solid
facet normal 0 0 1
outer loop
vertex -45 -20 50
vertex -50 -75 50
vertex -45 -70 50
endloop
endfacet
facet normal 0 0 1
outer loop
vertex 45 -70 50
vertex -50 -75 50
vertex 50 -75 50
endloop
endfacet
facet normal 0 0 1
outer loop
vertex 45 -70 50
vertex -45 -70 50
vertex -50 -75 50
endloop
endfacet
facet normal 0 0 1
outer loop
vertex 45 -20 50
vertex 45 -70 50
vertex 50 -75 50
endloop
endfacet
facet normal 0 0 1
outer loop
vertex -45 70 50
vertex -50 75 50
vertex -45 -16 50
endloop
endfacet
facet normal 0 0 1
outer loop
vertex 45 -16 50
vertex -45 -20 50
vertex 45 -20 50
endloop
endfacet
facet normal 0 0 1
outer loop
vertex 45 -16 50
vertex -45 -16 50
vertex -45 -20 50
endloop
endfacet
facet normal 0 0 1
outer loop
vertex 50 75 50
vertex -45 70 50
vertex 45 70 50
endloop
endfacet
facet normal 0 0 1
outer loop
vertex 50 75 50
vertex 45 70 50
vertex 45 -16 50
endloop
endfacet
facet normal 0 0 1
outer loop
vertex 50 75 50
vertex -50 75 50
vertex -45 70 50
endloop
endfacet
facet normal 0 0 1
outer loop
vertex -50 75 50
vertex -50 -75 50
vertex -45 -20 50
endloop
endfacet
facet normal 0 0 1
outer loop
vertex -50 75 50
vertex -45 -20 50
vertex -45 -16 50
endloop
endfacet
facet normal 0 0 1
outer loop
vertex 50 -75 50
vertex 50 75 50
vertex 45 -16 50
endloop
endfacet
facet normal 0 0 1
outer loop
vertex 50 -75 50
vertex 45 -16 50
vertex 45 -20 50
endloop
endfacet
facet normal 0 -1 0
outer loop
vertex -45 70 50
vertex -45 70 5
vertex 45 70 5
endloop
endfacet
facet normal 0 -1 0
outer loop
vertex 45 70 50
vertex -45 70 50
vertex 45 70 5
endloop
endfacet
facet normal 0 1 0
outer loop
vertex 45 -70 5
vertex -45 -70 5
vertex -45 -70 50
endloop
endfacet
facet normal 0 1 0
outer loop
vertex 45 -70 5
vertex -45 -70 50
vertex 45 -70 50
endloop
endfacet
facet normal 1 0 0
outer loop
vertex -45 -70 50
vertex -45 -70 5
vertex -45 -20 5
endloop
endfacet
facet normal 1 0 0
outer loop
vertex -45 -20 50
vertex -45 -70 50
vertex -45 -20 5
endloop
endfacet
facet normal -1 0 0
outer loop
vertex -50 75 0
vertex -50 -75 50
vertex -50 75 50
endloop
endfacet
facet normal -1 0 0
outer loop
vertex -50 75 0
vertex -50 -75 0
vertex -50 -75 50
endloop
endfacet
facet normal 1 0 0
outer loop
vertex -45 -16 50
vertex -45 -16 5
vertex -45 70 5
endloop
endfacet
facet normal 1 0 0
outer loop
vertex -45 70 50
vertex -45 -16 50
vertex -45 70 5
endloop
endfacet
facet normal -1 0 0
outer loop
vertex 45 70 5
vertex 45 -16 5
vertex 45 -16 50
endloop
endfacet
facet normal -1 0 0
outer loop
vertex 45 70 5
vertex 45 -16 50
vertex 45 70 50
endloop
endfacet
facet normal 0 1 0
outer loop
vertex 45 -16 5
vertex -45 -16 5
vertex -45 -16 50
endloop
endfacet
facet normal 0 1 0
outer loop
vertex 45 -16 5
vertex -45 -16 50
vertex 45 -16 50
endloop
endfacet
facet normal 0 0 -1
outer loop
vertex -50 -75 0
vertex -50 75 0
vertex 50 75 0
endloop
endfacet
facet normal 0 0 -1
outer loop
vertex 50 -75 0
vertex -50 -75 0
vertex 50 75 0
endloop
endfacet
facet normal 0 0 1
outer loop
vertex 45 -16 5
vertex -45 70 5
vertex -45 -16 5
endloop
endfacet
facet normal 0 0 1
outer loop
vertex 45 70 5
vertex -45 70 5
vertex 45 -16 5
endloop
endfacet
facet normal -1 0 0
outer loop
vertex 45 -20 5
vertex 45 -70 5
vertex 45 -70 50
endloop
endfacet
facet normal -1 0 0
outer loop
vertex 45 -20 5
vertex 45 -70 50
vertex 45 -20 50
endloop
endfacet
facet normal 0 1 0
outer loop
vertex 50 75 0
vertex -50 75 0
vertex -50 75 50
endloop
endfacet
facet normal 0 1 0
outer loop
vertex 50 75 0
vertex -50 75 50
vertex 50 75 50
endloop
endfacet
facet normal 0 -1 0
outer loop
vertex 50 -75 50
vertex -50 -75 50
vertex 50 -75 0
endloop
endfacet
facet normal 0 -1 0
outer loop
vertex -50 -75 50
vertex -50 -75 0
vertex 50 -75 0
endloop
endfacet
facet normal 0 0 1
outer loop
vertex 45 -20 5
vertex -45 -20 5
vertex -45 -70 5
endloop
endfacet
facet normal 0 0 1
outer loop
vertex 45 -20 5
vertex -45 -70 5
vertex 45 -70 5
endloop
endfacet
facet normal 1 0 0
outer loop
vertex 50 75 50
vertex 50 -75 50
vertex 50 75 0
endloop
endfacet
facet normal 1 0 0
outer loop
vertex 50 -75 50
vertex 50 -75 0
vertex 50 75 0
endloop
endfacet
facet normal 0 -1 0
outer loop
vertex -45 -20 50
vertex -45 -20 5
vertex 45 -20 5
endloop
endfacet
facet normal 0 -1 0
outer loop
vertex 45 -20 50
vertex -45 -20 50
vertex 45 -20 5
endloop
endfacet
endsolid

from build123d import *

# Parameters (mm, degrees)
SKETCH1_W           = 100
SKETCH1_H           = 150
BOSS_EXTRUDE1_DEPTH = 5
SKETCH2_W           = 100
SKETCH2_H           = 150
SKETCH2_W_2         = 90
SKETCH2_H_2         = 86
SKETCH2_H_3         = 50
BOSS_EXTRUDE2_DEPTH = 45


with BuildPart() as part:
    # Sketch1 → Boss-Extrude1 (new body)
    with BuildSketch(Plane.XY):
        Rectangle(SKETCH1_W, SKETCH1_H)
    extrude(amount=BOSS_EXTRUDE1_DEPTH)

    # Sketch2 → Boss-Extrude2 (add)
    with BuildSketch(Plane.XY.offset(5)):
        Rectangle(SKETCH2_W, SKETCH2_H)
        with Locations((0, 27)):
            Rectangle(SKETCH2_W_2, SKETCH2_H_2, mode=Mode.SUBTRACT)
        with Locations((0, -45)):
            Rectangle(SKETCH2_W_2, SKETCH2_H_3, mode=Mode.SUBTRACT)
    extrude(amount=BOSS_EXTRUDE2_DEPTH)


solid = part.part
